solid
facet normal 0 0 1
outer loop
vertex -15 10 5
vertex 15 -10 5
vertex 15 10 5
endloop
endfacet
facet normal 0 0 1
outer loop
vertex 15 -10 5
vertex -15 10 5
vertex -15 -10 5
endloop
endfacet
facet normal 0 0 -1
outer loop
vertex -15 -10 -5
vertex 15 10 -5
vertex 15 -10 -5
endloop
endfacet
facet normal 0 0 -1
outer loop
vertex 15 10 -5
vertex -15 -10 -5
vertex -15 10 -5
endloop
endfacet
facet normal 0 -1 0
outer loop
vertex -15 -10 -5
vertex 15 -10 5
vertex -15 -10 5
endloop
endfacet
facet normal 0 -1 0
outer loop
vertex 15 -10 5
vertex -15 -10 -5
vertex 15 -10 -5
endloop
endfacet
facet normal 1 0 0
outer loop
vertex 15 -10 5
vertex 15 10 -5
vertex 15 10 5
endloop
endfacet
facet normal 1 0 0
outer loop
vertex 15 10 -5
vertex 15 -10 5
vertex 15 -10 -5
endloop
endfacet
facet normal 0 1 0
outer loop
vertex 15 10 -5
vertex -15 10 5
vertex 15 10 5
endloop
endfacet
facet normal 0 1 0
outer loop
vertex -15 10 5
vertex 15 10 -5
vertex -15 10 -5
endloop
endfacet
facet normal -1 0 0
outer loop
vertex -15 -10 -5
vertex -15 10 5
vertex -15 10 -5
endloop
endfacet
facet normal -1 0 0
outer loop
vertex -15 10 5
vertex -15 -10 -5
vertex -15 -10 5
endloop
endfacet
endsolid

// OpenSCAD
// Unit of length: Unit.MM
cube(size = [30.0, 20.0, 10.0], center = true);
